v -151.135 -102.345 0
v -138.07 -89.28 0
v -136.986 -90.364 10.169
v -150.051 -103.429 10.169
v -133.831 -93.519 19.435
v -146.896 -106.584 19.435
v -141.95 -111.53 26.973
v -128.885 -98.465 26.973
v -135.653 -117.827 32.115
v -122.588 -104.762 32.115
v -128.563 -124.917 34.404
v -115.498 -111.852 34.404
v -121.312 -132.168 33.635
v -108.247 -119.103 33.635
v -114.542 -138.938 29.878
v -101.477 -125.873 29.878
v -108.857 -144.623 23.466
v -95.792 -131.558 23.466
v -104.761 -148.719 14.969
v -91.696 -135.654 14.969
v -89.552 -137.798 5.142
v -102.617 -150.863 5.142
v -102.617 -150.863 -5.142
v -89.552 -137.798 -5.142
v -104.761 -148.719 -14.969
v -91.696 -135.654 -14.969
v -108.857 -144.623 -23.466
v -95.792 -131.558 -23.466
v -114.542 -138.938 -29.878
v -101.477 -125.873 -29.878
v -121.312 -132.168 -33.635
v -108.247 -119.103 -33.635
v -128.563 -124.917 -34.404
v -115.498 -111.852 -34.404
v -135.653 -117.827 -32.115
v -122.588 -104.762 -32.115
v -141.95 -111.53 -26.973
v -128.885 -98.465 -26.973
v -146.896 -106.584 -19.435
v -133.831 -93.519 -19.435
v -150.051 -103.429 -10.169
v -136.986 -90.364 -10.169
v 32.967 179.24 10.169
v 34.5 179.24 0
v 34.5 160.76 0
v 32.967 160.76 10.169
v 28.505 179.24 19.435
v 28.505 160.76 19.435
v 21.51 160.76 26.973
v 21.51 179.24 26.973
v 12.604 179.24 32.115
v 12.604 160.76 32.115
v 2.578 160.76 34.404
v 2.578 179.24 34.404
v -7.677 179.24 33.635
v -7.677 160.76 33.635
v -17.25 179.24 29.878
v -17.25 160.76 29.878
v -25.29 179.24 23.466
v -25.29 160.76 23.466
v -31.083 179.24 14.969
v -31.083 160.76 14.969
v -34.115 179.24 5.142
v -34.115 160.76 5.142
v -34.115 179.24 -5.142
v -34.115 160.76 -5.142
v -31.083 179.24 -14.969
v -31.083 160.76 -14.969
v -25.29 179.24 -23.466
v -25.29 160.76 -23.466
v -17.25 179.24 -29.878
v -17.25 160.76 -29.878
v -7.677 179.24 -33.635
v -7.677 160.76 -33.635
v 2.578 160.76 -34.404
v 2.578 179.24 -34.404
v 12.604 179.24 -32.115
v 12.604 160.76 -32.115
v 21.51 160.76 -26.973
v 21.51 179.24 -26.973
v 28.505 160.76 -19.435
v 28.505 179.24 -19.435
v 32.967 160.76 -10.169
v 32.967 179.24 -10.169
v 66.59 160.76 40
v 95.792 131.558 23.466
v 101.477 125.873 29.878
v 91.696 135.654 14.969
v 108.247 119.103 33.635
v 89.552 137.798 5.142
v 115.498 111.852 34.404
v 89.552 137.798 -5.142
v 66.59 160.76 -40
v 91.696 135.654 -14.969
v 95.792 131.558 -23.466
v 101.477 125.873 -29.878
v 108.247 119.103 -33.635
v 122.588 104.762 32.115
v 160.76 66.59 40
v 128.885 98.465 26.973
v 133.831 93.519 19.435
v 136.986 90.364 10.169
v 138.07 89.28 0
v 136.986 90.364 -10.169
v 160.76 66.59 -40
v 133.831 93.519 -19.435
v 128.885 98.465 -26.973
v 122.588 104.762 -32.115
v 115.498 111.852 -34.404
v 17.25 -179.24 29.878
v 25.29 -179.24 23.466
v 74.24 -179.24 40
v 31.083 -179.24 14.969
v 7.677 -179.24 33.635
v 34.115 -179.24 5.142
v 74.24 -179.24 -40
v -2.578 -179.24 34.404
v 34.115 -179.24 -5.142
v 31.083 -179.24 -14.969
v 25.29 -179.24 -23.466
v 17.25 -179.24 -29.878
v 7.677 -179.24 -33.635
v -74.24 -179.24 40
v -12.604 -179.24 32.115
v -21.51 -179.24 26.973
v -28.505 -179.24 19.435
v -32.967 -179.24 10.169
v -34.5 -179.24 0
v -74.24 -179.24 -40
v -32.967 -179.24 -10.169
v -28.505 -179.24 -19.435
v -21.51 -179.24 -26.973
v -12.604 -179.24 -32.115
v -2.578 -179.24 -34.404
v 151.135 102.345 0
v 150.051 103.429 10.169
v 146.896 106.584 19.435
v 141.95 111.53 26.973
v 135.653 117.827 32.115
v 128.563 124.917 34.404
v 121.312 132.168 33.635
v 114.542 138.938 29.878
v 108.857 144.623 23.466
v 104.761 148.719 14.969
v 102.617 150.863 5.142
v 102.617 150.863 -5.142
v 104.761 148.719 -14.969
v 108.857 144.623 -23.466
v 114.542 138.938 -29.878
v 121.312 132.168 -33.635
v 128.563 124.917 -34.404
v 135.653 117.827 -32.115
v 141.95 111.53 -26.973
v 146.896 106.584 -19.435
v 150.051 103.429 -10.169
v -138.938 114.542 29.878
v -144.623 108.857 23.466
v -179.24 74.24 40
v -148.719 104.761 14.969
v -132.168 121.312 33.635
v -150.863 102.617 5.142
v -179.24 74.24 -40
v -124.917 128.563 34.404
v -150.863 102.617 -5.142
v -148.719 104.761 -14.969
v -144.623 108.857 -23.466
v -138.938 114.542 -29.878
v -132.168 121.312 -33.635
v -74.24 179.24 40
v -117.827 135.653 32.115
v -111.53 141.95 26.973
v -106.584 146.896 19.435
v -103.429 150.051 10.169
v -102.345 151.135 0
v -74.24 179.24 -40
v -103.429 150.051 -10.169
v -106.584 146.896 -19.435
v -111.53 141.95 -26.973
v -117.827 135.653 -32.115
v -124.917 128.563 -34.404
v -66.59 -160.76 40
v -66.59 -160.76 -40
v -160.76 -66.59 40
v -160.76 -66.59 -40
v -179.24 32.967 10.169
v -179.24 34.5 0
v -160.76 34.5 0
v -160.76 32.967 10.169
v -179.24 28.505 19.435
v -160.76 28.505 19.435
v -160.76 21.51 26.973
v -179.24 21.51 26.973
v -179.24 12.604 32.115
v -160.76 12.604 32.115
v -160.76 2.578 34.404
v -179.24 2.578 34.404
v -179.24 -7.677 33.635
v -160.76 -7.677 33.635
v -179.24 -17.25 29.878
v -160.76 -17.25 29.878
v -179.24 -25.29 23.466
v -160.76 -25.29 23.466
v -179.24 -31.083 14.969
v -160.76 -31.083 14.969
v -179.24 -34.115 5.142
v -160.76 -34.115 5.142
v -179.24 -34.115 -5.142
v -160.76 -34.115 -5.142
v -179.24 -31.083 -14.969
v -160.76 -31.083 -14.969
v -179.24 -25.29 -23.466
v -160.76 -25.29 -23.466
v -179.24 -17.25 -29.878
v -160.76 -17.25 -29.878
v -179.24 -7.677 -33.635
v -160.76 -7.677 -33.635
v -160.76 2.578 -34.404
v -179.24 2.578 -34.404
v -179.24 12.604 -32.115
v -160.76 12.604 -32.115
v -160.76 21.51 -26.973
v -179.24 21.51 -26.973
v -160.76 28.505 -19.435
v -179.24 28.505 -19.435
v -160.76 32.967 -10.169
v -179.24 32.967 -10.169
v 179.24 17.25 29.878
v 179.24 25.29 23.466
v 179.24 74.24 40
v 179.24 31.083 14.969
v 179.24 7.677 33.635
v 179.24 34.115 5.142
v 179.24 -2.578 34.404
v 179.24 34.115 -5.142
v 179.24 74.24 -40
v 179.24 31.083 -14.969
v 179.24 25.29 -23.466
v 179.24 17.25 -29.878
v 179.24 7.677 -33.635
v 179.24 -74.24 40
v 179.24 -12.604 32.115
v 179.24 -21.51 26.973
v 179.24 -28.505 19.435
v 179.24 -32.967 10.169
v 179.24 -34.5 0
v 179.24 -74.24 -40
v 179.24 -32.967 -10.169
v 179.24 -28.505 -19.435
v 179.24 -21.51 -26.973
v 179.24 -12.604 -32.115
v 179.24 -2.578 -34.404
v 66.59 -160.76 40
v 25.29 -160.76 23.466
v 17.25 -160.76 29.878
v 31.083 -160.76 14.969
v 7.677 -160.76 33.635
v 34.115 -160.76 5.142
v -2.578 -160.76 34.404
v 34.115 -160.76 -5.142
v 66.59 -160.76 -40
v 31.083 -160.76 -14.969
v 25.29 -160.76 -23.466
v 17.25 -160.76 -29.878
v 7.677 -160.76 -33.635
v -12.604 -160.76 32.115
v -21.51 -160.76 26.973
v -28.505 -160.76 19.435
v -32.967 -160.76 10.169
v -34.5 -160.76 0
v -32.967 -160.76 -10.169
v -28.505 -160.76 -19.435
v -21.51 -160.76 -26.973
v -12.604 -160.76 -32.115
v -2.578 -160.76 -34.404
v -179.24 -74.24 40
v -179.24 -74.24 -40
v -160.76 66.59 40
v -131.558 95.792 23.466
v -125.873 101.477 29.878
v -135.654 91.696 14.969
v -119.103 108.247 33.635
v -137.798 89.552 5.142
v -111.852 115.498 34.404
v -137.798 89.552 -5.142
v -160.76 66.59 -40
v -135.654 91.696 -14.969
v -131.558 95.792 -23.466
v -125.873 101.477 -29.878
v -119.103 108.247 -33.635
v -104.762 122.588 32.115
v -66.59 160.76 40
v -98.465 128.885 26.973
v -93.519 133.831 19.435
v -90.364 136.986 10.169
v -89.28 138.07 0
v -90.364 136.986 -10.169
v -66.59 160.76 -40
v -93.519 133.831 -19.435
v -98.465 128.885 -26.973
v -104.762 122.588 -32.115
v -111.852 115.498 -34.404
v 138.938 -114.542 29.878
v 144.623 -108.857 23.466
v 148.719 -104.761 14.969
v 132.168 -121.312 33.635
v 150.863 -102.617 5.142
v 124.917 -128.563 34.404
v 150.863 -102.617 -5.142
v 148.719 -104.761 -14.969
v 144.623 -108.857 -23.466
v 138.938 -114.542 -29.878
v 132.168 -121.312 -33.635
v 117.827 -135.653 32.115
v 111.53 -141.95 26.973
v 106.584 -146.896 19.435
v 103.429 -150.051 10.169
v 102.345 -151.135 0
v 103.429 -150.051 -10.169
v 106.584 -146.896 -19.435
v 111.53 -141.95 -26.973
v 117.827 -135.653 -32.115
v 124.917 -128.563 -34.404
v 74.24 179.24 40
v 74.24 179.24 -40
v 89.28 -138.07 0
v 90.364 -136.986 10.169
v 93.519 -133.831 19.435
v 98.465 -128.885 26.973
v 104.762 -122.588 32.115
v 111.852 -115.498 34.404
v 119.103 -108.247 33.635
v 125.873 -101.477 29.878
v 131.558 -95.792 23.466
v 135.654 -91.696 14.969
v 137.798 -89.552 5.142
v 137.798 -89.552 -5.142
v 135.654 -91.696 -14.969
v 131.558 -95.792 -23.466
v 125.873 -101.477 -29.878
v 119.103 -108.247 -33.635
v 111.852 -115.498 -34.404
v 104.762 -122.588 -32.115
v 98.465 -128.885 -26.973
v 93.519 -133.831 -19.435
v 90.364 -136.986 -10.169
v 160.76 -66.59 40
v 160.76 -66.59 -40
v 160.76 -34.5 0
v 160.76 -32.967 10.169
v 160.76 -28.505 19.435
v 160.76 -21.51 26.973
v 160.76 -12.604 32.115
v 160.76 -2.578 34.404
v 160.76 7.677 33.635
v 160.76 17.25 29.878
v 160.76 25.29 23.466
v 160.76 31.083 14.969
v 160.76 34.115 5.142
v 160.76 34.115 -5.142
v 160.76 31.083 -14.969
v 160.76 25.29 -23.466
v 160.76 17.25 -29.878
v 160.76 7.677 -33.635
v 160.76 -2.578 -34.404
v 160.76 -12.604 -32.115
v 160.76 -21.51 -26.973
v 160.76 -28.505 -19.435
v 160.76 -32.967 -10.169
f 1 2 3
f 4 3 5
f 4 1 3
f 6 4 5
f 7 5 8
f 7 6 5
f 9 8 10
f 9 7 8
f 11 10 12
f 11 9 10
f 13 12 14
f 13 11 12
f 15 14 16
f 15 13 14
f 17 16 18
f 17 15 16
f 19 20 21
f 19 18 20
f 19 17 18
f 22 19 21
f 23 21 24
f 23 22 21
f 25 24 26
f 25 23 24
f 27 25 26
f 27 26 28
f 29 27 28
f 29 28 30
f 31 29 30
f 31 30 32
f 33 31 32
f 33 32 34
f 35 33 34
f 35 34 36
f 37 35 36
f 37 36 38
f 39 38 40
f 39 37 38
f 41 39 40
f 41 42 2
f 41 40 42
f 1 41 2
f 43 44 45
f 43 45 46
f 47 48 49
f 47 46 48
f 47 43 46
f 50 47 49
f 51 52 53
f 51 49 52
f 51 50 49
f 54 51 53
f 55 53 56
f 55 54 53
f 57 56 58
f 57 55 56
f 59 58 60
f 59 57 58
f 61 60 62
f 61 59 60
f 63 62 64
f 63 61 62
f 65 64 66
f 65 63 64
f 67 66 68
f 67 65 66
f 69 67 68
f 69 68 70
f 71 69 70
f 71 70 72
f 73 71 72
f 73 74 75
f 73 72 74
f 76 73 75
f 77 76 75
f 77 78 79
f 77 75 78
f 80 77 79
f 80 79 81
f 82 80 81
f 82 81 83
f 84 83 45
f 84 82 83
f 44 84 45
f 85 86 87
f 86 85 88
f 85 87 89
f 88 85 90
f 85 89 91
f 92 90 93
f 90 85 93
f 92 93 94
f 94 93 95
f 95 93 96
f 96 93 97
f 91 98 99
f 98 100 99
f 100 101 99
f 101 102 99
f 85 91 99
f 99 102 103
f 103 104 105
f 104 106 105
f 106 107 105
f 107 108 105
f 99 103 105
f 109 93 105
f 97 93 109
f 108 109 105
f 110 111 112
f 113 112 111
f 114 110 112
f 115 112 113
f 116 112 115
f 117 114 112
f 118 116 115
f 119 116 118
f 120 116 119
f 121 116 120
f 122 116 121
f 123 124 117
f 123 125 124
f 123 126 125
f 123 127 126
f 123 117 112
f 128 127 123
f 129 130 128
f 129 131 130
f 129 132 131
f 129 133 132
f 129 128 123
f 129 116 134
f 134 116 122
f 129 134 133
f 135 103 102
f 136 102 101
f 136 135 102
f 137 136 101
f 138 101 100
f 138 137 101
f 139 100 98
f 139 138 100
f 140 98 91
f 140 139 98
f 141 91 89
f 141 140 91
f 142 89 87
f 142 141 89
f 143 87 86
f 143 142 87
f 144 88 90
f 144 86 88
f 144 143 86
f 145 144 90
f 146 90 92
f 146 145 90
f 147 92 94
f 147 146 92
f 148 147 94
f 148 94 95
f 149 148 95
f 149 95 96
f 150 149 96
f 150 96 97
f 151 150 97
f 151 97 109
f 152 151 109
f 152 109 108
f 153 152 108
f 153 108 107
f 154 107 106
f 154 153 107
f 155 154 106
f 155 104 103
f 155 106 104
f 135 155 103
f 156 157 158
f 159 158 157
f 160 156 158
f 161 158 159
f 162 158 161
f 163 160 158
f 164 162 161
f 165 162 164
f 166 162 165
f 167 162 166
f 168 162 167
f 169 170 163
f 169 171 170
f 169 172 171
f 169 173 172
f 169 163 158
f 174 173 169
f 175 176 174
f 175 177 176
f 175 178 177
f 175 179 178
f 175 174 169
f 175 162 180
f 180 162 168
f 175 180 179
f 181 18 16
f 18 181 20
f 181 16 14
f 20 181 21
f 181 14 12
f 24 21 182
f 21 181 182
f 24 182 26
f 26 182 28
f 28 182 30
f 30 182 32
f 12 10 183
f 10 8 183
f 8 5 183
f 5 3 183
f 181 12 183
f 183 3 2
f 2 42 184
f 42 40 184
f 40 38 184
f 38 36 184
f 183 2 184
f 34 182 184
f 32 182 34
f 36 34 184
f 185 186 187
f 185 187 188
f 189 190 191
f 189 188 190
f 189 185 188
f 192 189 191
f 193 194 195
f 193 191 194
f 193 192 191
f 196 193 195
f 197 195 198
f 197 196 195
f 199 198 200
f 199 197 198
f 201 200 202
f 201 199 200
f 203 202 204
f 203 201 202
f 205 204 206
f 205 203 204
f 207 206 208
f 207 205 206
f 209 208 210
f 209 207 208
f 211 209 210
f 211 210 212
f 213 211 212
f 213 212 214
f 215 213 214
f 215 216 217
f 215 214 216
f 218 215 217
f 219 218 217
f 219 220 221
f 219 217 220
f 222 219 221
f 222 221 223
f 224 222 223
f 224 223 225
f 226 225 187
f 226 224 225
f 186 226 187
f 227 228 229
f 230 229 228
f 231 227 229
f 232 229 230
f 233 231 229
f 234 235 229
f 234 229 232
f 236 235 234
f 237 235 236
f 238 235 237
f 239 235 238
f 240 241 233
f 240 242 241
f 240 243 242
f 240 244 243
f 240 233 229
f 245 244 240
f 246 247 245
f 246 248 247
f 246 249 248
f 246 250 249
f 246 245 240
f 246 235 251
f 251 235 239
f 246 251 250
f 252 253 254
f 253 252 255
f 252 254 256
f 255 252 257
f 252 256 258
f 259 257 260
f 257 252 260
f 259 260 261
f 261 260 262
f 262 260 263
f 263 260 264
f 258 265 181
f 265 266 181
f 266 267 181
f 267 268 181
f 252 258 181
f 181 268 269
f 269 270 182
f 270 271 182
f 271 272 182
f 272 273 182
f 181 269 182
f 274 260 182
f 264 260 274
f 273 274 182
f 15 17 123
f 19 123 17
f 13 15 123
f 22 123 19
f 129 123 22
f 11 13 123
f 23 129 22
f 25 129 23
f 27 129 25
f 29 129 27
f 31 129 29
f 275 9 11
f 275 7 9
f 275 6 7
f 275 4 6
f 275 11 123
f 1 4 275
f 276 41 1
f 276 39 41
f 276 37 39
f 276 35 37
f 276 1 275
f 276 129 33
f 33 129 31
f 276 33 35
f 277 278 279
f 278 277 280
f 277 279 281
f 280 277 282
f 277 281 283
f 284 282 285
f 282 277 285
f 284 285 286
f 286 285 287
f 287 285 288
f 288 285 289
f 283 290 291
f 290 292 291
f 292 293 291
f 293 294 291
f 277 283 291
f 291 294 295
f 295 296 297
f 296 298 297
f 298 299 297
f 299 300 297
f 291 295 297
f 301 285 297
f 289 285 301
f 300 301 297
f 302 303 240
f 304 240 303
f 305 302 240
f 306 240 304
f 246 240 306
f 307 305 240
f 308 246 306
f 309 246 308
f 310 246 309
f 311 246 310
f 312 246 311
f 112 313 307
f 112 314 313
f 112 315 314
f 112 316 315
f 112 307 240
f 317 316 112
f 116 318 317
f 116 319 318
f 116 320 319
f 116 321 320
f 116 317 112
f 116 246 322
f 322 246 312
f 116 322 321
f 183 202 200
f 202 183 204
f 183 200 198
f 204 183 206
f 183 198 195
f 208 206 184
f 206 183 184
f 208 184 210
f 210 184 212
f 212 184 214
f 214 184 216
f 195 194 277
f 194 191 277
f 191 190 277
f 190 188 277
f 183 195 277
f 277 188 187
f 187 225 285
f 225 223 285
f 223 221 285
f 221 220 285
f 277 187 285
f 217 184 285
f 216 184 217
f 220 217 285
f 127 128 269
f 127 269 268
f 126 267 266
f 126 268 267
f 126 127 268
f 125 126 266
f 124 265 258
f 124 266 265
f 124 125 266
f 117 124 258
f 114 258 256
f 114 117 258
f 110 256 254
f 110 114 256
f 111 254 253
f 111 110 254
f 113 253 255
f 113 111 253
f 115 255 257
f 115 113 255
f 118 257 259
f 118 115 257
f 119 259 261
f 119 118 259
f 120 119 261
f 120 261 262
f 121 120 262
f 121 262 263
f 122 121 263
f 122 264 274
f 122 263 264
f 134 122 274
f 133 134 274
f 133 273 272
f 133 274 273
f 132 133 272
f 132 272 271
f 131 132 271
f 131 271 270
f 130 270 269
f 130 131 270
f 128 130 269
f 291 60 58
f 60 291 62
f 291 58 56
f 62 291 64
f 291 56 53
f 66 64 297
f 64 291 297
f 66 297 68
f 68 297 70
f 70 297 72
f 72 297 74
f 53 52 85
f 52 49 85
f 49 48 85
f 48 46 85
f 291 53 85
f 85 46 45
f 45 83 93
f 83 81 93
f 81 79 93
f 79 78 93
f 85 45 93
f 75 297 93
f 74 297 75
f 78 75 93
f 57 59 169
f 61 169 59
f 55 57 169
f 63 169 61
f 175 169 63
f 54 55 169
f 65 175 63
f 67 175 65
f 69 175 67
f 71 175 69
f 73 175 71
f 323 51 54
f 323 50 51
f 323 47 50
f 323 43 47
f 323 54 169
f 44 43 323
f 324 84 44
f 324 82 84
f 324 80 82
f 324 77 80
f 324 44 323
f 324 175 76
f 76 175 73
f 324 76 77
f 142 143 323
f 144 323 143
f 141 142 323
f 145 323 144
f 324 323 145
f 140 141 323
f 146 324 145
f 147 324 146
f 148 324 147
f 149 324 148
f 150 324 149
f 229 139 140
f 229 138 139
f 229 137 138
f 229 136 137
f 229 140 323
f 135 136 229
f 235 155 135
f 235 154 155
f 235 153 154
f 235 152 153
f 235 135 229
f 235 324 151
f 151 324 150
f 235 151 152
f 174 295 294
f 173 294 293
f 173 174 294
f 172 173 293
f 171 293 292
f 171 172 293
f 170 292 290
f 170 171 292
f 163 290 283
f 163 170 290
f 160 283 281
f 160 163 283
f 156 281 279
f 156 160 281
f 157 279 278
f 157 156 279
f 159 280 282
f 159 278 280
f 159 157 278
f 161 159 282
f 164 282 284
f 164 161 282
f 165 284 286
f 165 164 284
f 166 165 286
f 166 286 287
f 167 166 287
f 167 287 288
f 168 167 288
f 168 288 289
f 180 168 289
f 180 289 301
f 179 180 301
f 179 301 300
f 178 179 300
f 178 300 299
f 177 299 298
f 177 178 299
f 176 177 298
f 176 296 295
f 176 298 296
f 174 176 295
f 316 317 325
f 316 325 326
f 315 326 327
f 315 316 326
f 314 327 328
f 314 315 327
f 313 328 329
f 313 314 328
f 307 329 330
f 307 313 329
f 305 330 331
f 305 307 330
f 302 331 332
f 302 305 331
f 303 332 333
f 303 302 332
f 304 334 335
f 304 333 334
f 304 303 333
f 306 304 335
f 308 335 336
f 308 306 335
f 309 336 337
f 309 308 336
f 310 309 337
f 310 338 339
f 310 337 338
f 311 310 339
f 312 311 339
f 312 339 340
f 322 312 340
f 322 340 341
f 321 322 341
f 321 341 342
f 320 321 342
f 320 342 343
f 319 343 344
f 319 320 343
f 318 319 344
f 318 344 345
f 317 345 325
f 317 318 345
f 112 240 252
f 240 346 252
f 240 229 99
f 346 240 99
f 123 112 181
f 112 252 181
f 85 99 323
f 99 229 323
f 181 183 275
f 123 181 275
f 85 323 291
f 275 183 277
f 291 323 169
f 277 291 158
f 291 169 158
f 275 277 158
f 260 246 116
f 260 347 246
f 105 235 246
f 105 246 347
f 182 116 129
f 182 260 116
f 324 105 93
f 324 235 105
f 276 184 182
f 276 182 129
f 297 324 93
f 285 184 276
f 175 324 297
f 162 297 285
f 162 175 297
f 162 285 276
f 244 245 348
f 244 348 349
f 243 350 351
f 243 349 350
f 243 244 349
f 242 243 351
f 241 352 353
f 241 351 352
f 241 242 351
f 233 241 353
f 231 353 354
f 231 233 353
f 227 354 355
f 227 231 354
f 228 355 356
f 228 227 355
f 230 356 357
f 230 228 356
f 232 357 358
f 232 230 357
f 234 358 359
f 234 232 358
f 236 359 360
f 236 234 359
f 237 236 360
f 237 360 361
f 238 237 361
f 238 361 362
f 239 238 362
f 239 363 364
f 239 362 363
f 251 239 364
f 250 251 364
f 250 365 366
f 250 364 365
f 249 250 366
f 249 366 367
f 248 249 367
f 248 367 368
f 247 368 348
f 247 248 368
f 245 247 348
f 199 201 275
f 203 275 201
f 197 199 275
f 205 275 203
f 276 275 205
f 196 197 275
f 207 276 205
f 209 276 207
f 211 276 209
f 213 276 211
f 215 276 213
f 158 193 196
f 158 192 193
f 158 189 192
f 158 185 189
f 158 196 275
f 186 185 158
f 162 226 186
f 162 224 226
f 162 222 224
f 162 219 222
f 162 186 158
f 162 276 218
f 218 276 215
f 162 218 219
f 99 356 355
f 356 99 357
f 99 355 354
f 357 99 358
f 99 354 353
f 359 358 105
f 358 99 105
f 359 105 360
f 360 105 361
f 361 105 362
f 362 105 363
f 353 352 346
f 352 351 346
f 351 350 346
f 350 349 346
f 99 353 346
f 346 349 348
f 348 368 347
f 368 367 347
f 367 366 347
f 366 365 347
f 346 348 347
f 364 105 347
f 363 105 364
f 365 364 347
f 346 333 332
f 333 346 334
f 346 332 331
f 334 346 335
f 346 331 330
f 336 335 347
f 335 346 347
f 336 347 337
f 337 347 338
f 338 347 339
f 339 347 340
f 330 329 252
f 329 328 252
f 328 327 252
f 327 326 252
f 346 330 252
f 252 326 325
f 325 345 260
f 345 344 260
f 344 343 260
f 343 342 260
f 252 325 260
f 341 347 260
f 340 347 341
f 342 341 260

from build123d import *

# Parameters (mm, degrees)
CYLINDER002_R               = 34.5
CYLINDER002_DEPTH           = 20
COMPOUND_PLACEMENT_ANGLE    = 45
CYLINDER003_R               = 34.5
CYLINDER003_DEPTH           = 20
COMPOUND001_PLACEMENT_ANGLE = 90
CYLINDER004_R               = 34.5
CYLINDER004_DEPTH           = 20
COMPOUND002_PLACEMENT_ANGLE = 135
CYLINDER005_R               = 34.5
CYLINDER005_DEPTH           = 20
COMPOUND003_PLACEMENT_ANGLE = 180
CYLINDER006_R               = 34.5
CYLINDER006_DEPTH           = 20
COMPOUND004_PLACEMENT_ANGLE = 225
CYLINDER007_R               = 34.5
CYLINDER007_DEPTH           = 20
COMPOUND005_PLACEMENT_ANGLE = 270
CYLINDER008_R               = 34.5
CYLINDER008_DEPTH           = 20
COMPOUND006_PLACEMENT_ANGLE = 315
CYLINDER_R                  = 34.5
CYLINDER_DEPTH              = 20
EXTRUDE001_DEPTH            = 80
EXTRUDE_DEPTH               = 80


with BuildPart() as compound:
    # Cylinder002 → Cylinder002 (new body)
    with BuildSketch(Plane.XZ.offset(-179.75)):
        Circle(CYLINDER002_R)
    extrude(amount=CYLINDER002_DEPTH)


with BuildPart() as compound_1:
    # Compound placement: moved
    add(compound.part.rotate(Axis((0, 0, 0), (0, 0, 1)), COMPOUND_PLACEMENT_ANGLE))


with BuildPart() as compound001:
    # Cylinder003 → Cylinder003 (new body)
    with BuildSketch(Plane.XZ.offset(-179.75)):
        Circle(CYLINDER003_R)
    extrude(amount=CYLINDER003_DEPTH)


with BuildPart() as compound001_1:
    # Compound001 placement: moved
    add(compound001.part.rotate(Axis((0, 0, 0), (0, 0, 1)), COMPOUND001_PLACEMENT_ANGLE))


with BuildPart() as compound002:
    # Cylinder004 → Cylinder004 (new body)
    with BuildSketch(Plane.XZ.offset(-179.75)):
        Circle(CYLINDER004_R)
    extrude(amount=CYLINDER004_DEPTH)


with BuildPart() as compound002_1:
    # Compound002 placement: moved
    add(compound002.part.rotate(Axis((0, 0, 0), (0, 0, 1)), COMPOUND002_PLACEMENT_ANGLE))


with BuildPart() as compound003:
    # Cylinder005 → Cylinder005 (new body)
    with BuildSketch(Plane.XZ.offset(-179.75)):
        Circle(CYLINDER005_R)
    extrude(amount=CYLINDER005_DEPTH)


with BuildPart() as compound003_1:
    # Compound003 placement: moved
    add(compound003.part.rotate(Axis((0, 0, 0), (0, 0, 1)), COMPOUND003_PLACEMENT_ANGLE))


with BuildPart() as compound004:
    # Cylinder006 → Cylinder006 (new body)
    with BuildSketch(Plane.XZ.offset(-179.75)):
        Circle(CYLINDER006_R)
    extrude(amount=CYLINDER006_DEPTH)


with BuildPart() as compound004_1:
    # Compound004 placement: moved
    add(compound004.part.rotate(Axis((0, 0, 0), (0, 0, 1)), COMPOUND004_PLACEMENT_ANGLE))


with BuildPart() as compound005:
    # Cylinder007 → Cylinder007 (new body)
    with BuildSketch(Plane.XZ.offset(-179.75)):
        Circle(CYLINDER007_R)
    extrude(amount=CYLINDER007_DEPTH)


with BuildPart() as compound005_1:
    # Compound005 placement: moved
    add(compound005.part.rotate(Axis((0, 0, 0), (0, 0, 1)), COMPOUND005_PLACEMENT_ANGLE))


with BuildPart() as compound006:
    # Cylinder008 → Cylinder008 (new body)
    with BuildSketch(Plane.XZ.offset(-179.75)):
        Circle(CYLINDER008_R)
    extrude(amount=CYLINDER008_DEPTH)


with BuildPart() as compound006_1:
    # Compound006 placement: moved
    add(compound006.part.rotate(Axis((0, 0, 0), (0, 0, 1)), COMPOUND006_PLACEMENT_ANGLE))


with BuildPart() as compound007:
    # Cylinder → Cylinder (new body)
    with BuildSketch(Plane.XZ.offset(-179.75)):
        Circle(CYLINDER_R)
    extrude(amount=CYLINDER_DEPTH)

    # Compound007: union Compound, Compound001, Compound002, Compound003, Compound004, Compound005, Compound006
    add(compound_1.part)
    add(compound001_1.part)
    add(compound002_1.part)
    add(compound003_1.part)
    add(compound004_1.part)
    add(compound005_1.part)
    add(compound006_1.part)


with BuildPart() as extrude001:
    # Wire001 → Extrude001 (new body)
    with BuildSketch(Plane.XY.offset(-40)):
        Polygon((66.59, 160.76), (160.76, 66.59), (160.76, -66.59), (66.59, -160.76), (-66.59, -160.76), (-160.76, -66.59), (-160.76, 66.59), (-66.59, 160.76), align=None)
    extrude(amount=EXTRUDE001_DEPTH)


with BuildPart() as cut001:
    # Wire → Extrude (new body)
    with BuildSketch(Plane.XY.offset(-40)):
        Polygon((74.24, 179.24), (179.24, 74.24), (179.24, -74.24), (74.24, -179.24), (-74.24, -179.24), (-179.24, -74.24), (-179.24, 74.24), (-74.24, 179.24), align=None)
    extrude(amount=EXTRUDE_DEPTH)

    # Cut: cut Extrude001
    add(extrude001.part, mode=Mode.SUBTRACT)

    # Cut001: cut Compound007
    add(compound007.part, mode=Mode.SUBTRACT)


solid = cut001.part
